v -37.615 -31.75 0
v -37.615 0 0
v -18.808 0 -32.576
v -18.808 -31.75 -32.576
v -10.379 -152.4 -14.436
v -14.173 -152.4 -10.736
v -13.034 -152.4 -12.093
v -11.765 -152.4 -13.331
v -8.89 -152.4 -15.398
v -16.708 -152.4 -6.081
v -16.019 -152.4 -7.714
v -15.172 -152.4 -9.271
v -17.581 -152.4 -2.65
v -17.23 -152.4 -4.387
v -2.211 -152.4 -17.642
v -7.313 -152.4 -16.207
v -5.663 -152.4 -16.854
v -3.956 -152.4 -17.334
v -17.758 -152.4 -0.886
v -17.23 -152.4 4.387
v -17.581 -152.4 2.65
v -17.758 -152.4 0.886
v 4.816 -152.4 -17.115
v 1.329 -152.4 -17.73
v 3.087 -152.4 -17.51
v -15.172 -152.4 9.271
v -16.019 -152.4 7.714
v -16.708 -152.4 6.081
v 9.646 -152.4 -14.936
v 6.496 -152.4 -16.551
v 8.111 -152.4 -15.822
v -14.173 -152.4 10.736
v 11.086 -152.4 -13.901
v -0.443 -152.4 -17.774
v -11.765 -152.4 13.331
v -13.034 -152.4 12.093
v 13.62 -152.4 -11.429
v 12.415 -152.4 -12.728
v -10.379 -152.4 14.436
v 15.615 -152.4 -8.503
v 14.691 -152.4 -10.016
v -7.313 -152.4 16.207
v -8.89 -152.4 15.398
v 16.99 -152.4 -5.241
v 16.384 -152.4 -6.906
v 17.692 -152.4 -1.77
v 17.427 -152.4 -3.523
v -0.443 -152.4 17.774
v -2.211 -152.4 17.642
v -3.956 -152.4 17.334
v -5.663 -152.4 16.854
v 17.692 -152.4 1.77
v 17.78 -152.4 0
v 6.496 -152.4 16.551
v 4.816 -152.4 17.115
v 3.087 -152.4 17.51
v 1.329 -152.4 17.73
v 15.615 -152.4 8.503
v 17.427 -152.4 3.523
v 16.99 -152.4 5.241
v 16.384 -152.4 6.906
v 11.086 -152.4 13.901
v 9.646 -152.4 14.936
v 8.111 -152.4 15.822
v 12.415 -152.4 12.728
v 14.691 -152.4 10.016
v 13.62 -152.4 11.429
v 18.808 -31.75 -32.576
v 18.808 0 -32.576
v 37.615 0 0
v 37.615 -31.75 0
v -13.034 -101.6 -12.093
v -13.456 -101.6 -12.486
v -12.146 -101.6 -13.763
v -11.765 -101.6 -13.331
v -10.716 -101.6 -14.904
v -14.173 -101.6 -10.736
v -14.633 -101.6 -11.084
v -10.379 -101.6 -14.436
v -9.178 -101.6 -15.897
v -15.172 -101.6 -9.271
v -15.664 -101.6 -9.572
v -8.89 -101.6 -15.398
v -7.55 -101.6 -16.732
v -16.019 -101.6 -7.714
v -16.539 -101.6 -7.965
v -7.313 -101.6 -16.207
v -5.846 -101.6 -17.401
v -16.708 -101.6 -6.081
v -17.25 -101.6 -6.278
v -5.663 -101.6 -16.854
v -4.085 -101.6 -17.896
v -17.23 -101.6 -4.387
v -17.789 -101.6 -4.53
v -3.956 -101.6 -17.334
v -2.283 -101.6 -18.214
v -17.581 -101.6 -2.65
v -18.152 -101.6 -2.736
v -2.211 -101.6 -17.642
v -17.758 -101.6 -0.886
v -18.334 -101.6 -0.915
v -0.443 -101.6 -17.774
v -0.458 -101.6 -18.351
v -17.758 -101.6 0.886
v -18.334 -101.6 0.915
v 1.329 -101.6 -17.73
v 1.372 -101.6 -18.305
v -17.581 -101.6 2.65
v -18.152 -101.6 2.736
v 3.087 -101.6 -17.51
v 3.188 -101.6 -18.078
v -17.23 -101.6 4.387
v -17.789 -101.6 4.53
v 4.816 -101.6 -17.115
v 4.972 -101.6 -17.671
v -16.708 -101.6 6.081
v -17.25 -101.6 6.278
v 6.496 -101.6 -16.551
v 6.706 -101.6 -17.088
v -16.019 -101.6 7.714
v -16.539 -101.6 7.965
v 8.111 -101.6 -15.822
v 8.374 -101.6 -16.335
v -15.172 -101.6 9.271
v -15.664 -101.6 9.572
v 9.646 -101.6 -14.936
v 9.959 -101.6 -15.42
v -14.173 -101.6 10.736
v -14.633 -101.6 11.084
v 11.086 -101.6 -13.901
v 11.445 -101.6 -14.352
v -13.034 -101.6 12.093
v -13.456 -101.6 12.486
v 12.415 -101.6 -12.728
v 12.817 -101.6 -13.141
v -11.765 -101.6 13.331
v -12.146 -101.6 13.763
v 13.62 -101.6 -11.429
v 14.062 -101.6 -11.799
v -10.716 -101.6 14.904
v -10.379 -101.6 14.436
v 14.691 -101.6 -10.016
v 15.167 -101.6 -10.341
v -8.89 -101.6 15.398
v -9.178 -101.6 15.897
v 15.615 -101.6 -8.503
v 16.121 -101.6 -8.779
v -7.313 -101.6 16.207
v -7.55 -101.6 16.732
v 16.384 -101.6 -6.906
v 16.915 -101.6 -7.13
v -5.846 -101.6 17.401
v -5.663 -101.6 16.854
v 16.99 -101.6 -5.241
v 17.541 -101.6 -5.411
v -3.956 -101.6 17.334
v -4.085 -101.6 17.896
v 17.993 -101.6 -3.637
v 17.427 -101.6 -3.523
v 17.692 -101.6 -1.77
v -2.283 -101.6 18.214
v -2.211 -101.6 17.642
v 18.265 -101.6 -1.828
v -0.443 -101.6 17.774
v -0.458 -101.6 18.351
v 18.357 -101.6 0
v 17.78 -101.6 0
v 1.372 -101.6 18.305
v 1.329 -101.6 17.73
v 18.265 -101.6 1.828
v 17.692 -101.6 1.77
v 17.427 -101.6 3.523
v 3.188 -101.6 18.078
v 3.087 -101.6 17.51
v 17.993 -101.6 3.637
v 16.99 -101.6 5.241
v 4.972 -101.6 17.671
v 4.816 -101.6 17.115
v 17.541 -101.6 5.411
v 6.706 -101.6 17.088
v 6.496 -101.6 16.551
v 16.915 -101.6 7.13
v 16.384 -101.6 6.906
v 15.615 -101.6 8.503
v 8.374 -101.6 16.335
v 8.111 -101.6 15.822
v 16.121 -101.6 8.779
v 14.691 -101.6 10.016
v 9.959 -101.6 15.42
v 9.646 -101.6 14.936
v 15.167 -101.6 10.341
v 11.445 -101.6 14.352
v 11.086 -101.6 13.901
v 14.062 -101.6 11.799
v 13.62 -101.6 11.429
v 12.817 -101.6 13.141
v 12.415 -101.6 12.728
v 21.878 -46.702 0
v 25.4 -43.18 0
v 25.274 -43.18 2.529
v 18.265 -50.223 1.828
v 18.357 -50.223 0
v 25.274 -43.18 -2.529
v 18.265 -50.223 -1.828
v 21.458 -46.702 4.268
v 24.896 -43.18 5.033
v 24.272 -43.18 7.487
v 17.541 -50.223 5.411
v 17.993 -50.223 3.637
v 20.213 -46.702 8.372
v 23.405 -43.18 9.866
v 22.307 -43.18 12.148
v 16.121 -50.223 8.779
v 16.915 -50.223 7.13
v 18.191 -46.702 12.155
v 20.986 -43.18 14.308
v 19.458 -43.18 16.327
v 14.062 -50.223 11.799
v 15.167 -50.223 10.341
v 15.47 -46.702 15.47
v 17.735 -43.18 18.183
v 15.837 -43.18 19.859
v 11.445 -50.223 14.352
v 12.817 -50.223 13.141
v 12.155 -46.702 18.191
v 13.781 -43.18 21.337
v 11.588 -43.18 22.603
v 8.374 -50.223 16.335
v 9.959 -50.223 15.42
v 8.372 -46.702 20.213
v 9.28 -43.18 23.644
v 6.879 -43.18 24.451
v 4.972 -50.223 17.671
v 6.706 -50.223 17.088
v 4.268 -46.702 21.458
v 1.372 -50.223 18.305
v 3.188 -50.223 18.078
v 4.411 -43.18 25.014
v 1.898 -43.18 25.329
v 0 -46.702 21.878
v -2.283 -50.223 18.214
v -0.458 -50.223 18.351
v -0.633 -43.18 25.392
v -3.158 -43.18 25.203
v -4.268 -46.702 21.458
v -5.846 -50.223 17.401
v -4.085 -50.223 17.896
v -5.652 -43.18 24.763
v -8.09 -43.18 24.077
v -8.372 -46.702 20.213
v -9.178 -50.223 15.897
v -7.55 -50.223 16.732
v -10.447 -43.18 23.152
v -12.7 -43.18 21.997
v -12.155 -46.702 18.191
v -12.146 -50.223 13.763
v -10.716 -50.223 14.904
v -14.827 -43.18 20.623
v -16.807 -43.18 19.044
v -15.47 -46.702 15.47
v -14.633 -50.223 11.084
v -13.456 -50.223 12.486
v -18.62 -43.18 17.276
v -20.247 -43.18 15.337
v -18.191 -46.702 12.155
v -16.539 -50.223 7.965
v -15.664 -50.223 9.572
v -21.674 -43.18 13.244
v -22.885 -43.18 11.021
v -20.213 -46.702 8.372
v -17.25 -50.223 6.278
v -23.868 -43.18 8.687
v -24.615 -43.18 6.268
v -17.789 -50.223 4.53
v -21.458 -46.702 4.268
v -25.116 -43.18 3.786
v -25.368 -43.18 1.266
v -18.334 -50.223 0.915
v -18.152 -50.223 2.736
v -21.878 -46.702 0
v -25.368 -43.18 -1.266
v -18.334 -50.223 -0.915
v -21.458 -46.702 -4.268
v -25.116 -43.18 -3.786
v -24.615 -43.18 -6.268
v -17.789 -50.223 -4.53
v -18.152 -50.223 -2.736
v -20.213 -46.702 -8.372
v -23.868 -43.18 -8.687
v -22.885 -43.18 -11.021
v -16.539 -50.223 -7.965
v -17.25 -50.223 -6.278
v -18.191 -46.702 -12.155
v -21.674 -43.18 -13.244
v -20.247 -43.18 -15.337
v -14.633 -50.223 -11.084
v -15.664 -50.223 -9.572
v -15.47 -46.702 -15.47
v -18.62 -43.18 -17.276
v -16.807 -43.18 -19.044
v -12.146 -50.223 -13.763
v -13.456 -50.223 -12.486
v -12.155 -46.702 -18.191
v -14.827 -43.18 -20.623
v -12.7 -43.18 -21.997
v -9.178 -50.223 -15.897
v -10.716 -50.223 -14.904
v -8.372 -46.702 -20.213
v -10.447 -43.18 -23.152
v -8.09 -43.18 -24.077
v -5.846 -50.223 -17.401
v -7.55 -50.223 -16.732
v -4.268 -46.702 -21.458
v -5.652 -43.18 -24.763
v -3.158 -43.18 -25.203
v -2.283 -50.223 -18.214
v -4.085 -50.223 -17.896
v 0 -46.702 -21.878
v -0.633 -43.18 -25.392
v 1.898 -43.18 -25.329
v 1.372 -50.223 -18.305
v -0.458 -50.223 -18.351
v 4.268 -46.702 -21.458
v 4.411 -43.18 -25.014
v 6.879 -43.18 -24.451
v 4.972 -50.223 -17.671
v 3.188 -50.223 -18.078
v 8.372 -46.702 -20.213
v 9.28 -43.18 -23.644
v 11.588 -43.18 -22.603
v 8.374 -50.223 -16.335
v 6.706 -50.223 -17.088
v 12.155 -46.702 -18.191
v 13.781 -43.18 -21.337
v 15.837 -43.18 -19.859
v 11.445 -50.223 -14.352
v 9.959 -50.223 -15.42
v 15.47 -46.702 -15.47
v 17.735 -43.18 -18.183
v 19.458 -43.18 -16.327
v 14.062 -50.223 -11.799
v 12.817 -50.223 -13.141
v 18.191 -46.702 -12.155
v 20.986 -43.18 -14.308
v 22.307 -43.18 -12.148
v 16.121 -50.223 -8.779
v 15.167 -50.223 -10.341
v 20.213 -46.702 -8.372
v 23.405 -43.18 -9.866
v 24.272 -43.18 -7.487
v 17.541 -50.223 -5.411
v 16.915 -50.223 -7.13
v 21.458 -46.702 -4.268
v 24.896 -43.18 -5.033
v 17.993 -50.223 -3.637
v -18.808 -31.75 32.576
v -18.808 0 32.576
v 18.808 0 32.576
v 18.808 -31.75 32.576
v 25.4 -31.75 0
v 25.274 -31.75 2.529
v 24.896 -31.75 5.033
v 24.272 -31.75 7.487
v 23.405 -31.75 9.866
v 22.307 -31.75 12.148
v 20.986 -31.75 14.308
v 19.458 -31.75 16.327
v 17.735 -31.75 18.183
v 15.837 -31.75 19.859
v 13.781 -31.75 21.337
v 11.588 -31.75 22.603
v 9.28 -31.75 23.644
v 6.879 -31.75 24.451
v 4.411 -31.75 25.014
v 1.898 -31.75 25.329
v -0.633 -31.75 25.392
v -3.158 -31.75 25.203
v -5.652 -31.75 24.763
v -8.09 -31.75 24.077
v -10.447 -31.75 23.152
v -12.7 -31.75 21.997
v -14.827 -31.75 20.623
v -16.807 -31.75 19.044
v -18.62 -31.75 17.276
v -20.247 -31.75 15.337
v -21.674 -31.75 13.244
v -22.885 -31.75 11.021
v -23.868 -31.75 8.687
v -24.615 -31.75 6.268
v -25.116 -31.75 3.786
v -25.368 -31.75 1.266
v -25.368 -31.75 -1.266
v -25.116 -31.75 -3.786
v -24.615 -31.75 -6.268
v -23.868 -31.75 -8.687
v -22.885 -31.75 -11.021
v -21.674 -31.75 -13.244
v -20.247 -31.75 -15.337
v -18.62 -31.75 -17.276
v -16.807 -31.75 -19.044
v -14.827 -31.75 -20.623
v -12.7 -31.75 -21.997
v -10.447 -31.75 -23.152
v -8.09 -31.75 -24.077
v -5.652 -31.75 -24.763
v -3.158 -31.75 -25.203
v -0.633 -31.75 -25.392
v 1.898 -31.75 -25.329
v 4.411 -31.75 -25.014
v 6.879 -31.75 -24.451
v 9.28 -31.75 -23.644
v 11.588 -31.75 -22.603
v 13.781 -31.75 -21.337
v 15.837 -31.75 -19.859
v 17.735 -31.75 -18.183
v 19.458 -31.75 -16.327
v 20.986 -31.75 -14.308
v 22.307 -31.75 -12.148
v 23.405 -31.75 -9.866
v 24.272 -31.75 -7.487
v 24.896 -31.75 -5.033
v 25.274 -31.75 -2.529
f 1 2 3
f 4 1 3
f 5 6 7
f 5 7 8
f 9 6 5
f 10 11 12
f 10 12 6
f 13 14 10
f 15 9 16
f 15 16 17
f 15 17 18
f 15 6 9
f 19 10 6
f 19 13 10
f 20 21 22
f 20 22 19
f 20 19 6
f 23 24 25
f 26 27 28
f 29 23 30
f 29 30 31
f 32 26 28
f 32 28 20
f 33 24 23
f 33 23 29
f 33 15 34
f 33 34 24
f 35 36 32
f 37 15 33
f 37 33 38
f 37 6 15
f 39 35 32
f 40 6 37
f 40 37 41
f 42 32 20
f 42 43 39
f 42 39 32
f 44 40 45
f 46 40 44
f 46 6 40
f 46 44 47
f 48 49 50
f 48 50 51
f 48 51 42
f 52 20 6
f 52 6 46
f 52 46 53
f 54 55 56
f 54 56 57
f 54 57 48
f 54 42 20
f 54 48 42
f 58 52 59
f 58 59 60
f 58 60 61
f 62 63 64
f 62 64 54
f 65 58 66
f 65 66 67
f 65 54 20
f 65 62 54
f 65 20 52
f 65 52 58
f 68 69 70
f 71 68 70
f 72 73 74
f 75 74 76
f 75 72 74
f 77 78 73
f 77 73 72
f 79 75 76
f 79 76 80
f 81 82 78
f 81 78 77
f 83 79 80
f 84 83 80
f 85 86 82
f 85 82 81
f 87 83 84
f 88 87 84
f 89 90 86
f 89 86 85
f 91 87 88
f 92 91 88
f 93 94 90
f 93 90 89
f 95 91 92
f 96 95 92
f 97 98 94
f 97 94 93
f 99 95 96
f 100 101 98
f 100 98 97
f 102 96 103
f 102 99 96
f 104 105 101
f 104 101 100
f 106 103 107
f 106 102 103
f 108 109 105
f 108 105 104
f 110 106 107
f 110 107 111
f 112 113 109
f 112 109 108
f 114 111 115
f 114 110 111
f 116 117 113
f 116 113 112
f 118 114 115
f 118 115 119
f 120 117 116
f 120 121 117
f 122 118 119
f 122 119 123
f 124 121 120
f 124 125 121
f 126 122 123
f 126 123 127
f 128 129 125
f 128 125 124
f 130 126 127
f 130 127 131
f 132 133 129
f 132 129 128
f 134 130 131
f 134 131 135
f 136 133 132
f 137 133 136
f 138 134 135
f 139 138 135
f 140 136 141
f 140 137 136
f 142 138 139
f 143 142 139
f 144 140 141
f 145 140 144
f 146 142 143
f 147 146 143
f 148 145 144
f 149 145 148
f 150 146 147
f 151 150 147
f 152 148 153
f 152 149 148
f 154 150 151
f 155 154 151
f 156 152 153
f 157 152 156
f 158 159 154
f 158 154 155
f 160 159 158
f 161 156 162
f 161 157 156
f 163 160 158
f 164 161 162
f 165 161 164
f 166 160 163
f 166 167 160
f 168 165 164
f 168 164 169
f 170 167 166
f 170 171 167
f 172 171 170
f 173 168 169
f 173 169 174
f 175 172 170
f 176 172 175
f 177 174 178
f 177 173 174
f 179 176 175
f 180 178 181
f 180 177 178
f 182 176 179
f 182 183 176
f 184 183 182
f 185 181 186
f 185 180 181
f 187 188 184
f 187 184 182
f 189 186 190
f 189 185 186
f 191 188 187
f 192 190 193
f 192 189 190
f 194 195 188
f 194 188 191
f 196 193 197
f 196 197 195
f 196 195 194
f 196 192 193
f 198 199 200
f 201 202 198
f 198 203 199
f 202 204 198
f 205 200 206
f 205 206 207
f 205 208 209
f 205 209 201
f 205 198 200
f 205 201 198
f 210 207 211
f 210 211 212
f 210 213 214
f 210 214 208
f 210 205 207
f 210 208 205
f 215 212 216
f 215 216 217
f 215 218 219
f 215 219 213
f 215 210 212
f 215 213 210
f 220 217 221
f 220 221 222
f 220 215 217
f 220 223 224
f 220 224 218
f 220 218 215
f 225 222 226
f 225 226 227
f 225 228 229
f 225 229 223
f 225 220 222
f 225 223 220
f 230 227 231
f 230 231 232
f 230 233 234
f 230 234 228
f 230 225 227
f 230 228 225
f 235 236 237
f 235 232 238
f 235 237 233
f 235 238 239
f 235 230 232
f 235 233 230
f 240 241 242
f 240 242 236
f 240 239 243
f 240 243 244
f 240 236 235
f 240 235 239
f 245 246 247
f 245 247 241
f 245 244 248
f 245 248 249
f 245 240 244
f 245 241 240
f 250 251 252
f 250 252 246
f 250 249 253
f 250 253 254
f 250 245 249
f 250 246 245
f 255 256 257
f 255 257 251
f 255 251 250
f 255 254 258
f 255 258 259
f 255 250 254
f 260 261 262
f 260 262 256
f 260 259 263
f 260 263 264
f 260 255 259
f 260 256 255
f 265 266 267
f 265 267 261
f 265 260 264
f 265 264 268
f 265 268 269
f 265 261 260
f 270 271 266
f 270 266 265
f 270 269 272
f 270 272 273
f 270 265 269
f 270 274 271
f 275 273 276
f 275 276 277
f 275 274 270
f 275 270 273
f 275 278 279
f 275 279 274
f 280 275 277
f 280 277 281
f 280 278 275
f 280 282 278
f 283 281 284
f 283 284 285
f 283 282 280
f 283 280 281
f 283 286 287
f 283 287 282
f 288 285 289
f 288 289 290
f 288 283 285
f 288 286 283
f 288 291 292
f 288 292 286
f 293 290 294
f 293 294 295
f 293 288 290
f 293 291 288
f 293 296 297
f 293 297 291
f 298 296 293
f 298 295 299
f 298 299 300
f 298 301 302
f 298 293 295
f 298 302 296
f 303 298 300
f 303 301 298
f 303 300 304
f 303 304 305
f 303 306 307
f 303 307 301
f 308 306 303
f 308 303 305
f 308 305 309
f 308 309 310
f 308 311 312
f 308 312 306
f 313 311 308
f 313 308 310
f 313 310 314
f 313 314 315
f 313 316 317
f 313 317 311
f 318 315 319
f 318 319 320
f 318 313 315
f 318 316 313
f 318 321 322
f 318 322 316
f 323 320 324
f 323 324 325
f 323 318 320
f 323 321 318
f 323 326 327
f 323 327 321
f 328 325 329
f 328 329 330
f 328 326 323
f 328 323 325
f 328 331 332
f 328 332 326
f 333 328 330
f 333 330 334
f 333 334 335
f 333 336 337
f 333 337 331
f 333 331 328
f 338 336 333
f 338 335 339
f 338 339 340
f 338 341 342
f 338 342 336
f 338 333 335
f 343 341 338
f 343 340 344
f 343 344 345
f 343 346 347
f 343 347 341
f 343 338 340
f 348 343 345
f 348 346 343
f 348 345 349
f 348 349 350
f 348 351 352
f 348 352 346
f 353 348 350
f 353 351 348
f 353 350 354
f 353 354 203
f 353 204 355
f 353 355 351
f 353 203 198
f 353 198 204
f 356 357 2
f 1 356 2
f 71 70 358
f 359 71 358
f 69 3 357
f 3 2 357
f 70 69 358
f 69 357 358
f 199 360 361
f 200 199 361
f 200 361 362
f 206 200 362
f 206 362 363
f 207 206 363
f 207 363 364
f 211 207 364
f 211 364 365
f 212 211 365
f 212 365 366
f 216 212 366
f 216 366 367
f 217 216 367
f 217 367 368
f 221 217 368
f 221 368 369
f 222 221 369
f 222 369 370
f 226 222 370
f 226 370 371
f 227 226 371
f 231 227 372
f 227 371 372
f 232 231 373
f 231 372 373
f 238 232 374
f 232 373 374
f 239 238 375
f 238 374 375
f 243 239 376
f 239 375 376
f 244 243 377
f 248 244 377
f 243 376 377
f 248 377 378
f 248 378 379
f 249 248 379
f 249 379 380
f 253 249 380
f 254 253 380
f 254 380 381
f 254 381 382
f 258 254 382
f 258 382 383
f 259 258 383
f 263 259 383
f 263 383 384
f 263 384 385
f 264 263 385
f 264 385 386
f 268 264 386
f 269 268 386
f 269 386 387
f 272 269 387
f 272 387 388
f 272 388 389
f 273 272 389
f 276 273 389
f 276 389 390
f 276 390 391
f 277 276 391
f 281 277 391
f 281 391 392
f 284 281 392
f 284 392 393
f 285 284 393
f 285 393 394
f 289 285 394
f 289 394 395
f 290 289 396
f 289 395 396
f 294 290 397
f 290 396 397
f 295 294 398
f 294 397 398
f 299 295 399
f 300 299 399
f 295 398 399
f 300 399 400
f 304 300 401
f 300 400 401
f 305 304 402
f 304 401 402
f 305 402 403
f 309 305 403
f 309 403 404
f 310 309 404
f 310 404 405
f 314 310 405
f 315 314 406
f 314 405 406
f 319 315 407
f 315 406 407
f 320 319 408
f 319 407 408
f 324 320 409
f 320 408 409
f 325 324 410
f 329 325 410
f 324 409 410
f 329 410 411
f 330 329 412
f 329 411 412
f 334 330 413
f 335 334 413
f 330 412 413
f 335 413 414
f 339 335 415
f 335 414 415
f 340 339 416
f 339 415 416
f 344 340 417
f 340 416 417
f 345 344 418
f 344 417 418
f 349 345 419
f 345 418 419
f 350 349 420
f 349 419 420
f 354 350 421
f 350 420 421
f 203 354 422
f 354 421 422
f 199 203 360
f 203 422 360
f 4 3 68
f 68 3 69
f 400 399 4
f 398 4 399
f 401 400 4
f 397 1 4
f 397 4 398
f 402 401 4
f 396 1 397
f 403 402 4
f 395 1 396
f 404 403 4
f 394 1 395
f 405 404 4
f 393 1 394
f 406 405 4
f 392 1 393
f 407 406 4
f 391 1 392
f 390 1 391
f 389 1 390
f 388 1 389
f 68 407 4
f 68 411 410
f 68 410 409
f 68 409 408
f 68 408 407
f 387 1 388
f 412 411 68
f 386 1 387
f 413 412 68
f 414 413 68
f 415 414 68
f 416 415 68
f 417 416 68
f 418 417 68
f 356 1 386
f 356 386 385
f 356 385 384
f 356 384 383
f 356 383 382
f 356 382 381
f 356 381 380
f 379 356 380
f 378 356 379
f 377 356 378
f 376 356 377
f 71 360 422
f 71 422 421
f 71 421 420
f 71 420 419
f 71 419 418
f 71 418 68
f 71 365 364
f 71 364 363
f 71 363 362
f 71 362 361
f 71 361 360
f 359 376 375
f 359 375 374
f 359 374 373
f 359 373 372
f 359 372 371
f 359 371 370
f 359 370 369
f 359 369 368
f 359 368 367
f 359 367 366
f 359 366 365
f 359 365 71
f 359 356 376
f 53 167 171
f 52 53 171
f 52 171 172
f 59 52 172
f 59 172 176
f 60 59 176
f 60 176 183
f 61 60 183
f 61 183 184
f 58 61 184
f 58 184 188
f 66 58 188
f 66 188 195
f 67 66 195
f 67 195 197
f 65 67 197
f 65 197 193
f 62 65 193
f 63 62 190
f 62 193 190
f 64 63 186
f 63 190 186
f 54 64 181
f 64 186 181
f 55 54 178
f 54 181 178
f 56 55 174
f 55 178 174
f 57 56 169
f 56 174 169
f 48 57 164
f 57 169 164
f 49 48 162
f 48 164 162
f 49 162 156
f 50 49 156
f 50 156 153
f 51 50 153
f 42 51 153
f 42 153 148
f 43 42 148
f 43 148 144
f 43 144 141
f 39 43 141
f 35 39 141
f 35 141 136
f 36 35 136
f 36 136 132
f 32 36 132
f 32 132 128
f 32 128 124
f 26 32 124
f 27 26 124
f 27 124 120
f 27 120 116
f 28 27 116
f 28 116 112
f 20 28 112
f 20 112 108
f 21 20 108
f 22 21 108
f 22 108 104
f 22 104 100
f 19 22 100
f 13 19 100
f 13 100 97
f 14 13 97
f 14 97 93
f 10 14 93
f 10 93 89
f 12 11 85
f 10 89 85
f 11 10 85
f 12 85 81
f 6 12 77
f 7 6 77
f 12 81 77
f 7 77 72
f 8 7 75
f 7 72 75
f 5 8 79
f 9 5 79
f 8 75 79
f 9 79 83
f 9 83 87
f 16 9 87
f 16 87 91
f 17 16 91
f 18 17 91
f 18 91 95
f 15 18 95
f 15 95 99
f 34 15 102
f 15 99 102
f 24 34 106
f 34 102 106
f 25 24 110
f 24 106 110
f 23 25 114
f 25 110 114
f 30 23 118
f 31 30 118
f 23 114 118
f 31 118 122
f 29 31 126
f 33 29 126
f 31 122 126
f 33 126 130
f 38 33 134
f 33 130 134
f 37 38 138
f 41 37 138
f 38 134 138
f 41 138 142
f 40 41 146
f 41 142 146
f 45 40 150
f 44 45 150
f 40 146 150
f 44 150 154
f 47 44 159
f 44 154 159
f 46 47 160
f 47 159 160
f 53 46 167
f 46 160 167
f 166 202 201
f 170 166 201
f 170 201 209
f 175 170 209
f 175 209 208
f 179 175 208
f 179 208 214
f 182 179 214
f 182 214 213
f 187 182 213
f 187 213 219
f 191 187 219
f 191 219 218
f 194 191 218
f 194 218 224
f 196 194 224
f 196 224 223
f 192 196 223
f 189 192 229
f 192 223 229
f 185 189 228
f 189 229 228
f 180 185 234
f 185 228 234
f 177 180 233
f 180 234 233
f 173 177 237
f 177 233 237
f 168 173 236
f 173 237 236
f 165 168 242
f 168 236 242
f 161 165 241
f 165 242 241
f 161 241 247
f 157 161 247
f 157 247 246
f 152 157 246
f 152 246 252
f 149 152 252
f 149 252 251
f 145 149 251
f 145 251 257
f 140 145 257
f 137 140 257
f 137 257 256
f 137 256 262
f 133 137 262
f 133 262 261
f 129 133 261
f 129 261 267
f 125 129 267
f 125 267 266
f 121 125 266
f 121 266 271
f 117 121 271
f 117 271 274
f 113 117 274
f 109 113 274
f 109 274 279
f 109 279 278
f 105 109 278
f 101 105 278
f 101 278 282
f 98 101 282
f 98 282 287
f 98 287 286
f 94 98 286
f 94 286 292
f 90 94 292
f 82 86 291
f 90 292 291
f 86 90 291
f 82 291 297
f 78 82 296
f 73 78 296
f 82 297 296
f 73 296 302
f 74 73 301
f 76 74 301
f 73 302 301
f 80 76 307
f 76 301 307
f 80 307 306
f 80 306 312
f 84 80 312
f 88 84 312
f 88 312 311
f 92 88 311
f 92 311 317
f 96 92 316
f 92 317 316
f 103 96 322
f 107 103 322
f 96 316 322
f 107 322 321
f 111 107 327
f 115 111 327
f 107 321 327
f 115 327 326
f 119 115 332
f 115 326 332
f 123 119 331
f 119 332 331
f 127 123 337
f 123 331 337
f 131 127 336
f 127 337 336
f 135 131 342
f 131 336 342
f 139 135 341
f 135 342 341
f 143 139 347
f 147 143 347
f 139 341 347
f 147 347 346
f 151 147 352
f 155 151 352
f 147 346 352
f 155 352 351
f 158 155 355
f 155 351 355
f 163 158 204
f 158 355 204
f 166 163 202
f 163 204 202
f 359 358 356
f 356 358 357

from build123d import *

# Parameters (mm, degrees)
F1_DEPTH  = 31.75
F2_R      = 25.4
F3_DEPTH  = 50.8
F4_SIZE   = 7.62
F5_R      = 18.356615
F3_FACE_R = 17.78
F6_DEPTH  = 101.6


with BuildPart() as f1:
    # F0 (on Front) → F1 (new body)
    with BuildSketch(Plane.XZ):
        Polygon((-18.807561, -32.575652), (18.807561, -32.575652), (37.615123, 0), (18.807561, 32.575652), (-18.807561, 32.575652), (-37.615123, 0), align=None)
    extrude(amount=F1_DEPTH)

    # F2 (on Front) → F3 (join)
    with BuildSketch(Plane.XZ):
        Circle(F2_R)
    extrude(amount=F3_DEPTH)

    # F4
    f4_edges = [f1.edges().sort_by_distance(p)[0] for p in [
        (-25.4, -50.8, 0),
    ]]
    chamfer(f4_edges, length=F4_SIZE)

    # F5 (on Front) + F3_face (on face) → F6 (join)
    with BuildSketch(Plane.XZ):
        Circle(F5_R)
    with BuildSketch(Plane.XZ.offset(50.8)):
        Circle(F3_FACE_R)
    extrude(amount=F6_DEPTH)


solid = f1.part
